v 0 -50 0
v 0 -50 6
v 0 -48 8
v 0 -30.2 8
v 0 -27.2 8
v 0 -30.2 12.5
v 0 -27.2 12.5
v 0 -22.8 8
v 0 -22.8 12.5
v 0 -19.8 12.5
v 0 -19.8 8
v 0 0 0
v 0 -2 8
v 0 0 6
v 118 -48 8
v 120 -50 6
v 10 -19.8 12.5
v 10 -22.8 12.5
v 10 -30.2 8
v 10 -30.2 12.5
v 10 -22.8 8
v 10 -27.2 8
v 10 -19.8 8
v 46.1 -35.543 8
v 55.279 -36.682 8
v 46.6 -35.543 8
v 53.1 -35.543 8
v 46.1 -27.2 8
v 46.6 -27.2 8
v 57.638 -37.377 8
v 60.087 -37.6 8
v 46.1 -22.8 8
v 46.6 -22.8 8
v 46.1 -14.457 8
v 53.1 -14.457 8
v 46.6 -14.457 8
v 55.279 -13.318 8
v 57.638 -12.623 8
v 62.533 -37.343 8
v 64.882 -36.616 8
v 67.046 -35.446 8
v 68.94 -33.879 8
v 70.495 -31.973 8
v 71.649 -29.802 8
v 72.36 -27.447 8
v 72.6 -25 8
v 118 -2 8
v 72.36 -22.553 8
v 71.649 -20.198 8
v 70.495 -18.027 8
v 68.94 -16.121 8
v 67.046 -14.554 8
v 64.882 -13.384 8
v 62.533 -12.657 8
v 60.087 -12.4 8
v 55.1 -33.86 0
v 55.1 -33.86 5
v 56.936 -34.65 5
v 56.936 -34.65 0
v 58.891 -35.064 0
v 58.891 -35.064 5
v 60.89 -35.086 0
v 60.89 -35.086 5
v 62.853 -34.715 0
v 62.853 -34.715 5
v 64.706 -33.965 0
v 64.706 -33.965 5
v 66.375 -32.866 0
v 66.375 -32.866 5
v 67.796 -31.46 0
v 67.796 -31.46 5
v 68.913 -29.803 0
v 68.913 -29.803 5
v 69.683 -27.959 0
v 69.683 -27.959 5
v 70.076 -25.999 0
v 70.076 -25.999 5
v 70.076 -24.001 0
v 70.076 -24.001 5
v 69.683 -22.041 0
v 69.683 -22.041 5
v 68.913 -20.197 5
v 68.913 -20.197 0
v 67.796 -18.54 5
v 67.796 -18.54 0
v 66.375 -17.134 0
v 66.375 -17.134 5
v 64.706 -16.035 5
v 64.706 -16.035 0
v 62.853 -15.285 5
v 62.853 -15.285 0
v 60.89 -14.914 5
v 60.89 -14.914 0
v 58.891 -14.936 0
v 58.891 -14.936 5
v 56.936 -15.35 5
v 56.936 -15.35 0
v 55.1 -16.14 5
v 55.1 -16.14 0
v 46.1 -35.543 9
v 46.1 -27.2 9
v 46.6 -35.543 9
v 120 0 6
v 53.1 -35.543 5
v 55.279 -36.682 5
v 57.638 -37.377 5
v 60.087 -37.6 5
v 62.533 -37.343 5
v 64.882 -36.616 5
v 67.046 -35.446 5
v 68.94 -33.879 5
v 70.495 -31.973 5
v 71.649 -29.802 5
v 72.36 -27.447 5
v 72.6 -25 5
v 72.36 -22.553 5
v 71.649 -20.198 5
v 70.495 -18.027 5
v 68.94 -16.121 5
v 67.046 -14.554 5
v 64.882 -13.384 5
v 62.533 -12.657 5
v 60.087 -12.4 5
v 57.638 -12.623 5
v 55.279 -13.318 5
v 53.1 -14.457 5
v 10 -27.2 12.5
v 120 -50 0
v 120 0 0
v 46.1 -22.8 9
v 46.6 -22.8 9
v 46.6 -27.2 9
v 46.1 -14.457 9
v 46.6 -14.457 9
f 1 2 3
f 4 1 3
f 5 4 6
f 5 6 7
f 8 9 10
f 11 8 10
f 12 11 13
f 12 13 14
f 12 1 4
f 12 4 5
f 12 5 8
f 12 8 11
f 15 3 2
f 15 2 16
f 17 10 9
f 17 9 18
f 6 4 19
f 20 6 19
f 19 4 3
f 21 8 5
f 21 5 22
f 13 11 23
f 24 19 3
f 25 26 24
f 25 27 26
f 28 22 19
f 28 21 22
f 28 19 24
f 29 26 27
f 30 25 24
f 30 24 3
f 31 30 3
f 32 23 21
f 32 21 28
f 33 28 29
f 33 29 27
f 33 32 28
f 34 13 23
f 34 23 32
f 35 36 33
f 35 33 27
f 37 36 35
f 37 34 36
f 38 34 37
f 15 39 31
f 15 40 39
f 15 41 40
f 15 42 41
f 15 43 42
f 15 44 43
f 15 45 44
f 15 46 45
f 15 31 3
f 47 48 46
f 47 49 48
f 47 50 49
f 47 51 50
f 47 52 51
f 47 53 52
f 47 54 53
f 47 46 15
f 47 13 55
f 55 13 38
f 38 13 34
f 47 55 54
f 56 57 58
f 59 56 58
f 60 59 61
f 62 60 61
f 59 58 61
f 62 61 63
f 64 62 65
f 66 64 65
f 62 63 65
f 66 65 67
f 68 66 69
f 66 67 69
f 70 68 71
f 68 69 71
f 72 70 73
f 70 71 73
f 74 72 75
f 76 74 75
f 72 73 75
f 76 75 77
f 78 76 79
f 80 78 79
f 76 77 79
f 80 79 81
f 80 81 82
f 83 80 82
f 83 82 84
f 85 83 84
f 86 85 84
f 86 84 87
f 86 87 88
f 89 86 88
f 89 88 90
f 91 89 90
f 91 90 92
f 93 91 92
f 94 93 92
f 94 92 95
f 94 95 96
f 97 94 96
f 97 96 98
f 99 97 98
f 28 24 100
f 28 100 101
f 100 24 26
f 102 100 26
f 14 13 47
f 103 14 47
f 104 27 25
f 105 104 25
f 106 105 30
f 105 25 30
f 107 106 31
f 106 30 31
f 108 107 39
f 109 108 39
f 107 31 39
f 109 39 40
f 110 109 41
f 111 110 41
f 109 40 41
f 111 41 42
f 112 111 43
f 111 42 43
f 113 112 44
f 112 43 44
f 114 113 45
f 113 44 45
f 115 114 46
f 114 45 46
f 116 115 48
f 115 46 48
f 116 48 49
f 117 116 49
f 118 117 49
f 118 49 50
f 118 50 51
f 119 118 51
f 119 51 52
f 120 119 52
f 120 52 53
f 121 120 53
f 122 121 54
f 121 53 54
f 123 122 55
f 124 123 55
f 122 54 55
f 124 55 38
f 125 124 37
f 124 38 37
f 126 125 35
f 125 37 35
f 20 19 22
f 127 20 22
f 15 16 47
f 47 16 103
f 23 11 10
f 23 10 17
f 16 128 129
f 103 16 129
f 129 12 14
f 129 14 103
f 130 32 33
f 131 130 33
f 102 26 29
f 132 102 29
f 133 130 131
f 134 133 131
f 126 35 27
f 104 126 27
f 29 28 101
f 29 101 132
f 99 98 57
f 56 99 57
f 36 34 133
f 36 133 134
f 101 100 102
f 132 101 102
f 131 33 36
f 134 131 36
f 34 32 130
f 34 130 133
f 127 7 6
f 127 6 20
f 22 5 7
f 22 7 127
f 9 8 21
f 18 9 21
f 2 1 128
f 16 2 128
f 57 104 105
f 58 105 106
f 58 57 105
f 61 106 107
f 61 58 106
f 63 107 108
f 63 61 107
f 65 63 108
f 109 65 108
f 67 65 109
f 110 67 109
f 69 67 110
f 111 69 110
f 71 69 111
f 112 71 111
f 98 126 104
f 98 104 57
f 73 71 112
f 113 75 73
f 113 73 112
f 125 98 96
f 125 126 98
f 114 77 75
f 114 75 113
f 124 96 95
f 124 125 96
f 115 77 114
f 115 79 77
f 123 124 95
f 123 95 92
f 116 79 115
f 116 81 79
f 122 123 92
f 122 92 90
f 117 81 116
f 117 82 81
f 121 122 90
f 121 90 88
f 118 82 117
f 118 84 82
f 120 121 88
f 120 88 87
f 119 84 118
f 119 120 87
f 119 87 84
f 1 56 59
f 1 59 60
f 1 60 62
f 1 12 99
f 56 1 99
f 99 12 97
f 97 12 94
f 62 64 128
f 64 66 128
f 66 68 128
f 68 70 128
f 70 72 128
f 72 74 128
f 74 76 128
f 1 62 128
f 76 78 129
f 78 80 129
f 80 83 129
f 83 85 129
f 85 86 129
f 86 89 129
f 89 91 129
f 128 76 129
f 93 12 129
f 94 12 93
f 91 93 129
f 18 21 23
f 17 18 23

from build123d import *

# Parameters (mm, degrees)
F0_W      = 120
F0_H      = 50
F1_DEPTH  = 8
F3_DEPTH  = 3
F5_DEPTH  = 25
F6_W      = 10
F6_H      = 3
F7_DEPTH  = 4.5
F8_SIZE   = 2
F9_W      = 0.5
F9_H      = 8.34277
F10_DEPTH = 1


with BuildPart() as f1:
    # F0 (on Top) → F1 (new body)
    with BuildSketch(Plane.XY):
        with Locations((60, -25)):
            Rectangle(F0_W, F0_H)
    extrude(amount=F1_DEPTH)

    # F2 (on face) → F3 (cut)
    with BuildSketch(Plane.XY.offset(8)):
        with BuildLine():
            Line((53.1, -14.45723), (53.1, -35.54277))
            ThreePointArc((53.1, -35.54277), (72.6, -25), (53.1, -14.45723))
        make_face()
    extrude(amount=-F3_DEPTH, mode=Mode.SUBTRACT)

    # F4 (on face) → F5 (cut)
    with BuildSketch(Plane.XY.offset(5)):
        with BuildLine():
            Line((55.1, -16.13966), (55.1, -33.86034))
            ThreePointArc((55.1, -33.86034), (70.125, -25), (55.1, -16.13966))
        make_face()
    extrude(amount=-F5_DEPTH, mode=Mode.SUBTRACT)

    # F6 (on face) → F7 (join)
    with BuildSketch(Plane.XY.offset(8)):
        with Locations((5, -21.3)):
            Rectangle(F6_W, F6_H)
        with Locations((5, -28.7)):
            Rectangle(F6_W, F6_H)
    extrude(amount=F7_DEPTH)

    # F8
    f8_edges = [f1.edges().sort_by_distance(p)[0] for p in [
        (120, -25, 8),
        (60, 0, 8),
        (60, -50, 8),
    ]]
    chamfer(f8_edges, length=F8_SIZE)

    # F9 (on face) → F10 (join)
    with BuildSketch(Plane.XY.offset(8)):
        with Locations((46.35, -18.628615)):
            Rectangle(F9_W, F9_H)
        with Locations((46.35, -31.371385)):
            Rectangle(F9_W, F9_H)
    extrude(amount=F10_DEPTH)


solid = f1.part
